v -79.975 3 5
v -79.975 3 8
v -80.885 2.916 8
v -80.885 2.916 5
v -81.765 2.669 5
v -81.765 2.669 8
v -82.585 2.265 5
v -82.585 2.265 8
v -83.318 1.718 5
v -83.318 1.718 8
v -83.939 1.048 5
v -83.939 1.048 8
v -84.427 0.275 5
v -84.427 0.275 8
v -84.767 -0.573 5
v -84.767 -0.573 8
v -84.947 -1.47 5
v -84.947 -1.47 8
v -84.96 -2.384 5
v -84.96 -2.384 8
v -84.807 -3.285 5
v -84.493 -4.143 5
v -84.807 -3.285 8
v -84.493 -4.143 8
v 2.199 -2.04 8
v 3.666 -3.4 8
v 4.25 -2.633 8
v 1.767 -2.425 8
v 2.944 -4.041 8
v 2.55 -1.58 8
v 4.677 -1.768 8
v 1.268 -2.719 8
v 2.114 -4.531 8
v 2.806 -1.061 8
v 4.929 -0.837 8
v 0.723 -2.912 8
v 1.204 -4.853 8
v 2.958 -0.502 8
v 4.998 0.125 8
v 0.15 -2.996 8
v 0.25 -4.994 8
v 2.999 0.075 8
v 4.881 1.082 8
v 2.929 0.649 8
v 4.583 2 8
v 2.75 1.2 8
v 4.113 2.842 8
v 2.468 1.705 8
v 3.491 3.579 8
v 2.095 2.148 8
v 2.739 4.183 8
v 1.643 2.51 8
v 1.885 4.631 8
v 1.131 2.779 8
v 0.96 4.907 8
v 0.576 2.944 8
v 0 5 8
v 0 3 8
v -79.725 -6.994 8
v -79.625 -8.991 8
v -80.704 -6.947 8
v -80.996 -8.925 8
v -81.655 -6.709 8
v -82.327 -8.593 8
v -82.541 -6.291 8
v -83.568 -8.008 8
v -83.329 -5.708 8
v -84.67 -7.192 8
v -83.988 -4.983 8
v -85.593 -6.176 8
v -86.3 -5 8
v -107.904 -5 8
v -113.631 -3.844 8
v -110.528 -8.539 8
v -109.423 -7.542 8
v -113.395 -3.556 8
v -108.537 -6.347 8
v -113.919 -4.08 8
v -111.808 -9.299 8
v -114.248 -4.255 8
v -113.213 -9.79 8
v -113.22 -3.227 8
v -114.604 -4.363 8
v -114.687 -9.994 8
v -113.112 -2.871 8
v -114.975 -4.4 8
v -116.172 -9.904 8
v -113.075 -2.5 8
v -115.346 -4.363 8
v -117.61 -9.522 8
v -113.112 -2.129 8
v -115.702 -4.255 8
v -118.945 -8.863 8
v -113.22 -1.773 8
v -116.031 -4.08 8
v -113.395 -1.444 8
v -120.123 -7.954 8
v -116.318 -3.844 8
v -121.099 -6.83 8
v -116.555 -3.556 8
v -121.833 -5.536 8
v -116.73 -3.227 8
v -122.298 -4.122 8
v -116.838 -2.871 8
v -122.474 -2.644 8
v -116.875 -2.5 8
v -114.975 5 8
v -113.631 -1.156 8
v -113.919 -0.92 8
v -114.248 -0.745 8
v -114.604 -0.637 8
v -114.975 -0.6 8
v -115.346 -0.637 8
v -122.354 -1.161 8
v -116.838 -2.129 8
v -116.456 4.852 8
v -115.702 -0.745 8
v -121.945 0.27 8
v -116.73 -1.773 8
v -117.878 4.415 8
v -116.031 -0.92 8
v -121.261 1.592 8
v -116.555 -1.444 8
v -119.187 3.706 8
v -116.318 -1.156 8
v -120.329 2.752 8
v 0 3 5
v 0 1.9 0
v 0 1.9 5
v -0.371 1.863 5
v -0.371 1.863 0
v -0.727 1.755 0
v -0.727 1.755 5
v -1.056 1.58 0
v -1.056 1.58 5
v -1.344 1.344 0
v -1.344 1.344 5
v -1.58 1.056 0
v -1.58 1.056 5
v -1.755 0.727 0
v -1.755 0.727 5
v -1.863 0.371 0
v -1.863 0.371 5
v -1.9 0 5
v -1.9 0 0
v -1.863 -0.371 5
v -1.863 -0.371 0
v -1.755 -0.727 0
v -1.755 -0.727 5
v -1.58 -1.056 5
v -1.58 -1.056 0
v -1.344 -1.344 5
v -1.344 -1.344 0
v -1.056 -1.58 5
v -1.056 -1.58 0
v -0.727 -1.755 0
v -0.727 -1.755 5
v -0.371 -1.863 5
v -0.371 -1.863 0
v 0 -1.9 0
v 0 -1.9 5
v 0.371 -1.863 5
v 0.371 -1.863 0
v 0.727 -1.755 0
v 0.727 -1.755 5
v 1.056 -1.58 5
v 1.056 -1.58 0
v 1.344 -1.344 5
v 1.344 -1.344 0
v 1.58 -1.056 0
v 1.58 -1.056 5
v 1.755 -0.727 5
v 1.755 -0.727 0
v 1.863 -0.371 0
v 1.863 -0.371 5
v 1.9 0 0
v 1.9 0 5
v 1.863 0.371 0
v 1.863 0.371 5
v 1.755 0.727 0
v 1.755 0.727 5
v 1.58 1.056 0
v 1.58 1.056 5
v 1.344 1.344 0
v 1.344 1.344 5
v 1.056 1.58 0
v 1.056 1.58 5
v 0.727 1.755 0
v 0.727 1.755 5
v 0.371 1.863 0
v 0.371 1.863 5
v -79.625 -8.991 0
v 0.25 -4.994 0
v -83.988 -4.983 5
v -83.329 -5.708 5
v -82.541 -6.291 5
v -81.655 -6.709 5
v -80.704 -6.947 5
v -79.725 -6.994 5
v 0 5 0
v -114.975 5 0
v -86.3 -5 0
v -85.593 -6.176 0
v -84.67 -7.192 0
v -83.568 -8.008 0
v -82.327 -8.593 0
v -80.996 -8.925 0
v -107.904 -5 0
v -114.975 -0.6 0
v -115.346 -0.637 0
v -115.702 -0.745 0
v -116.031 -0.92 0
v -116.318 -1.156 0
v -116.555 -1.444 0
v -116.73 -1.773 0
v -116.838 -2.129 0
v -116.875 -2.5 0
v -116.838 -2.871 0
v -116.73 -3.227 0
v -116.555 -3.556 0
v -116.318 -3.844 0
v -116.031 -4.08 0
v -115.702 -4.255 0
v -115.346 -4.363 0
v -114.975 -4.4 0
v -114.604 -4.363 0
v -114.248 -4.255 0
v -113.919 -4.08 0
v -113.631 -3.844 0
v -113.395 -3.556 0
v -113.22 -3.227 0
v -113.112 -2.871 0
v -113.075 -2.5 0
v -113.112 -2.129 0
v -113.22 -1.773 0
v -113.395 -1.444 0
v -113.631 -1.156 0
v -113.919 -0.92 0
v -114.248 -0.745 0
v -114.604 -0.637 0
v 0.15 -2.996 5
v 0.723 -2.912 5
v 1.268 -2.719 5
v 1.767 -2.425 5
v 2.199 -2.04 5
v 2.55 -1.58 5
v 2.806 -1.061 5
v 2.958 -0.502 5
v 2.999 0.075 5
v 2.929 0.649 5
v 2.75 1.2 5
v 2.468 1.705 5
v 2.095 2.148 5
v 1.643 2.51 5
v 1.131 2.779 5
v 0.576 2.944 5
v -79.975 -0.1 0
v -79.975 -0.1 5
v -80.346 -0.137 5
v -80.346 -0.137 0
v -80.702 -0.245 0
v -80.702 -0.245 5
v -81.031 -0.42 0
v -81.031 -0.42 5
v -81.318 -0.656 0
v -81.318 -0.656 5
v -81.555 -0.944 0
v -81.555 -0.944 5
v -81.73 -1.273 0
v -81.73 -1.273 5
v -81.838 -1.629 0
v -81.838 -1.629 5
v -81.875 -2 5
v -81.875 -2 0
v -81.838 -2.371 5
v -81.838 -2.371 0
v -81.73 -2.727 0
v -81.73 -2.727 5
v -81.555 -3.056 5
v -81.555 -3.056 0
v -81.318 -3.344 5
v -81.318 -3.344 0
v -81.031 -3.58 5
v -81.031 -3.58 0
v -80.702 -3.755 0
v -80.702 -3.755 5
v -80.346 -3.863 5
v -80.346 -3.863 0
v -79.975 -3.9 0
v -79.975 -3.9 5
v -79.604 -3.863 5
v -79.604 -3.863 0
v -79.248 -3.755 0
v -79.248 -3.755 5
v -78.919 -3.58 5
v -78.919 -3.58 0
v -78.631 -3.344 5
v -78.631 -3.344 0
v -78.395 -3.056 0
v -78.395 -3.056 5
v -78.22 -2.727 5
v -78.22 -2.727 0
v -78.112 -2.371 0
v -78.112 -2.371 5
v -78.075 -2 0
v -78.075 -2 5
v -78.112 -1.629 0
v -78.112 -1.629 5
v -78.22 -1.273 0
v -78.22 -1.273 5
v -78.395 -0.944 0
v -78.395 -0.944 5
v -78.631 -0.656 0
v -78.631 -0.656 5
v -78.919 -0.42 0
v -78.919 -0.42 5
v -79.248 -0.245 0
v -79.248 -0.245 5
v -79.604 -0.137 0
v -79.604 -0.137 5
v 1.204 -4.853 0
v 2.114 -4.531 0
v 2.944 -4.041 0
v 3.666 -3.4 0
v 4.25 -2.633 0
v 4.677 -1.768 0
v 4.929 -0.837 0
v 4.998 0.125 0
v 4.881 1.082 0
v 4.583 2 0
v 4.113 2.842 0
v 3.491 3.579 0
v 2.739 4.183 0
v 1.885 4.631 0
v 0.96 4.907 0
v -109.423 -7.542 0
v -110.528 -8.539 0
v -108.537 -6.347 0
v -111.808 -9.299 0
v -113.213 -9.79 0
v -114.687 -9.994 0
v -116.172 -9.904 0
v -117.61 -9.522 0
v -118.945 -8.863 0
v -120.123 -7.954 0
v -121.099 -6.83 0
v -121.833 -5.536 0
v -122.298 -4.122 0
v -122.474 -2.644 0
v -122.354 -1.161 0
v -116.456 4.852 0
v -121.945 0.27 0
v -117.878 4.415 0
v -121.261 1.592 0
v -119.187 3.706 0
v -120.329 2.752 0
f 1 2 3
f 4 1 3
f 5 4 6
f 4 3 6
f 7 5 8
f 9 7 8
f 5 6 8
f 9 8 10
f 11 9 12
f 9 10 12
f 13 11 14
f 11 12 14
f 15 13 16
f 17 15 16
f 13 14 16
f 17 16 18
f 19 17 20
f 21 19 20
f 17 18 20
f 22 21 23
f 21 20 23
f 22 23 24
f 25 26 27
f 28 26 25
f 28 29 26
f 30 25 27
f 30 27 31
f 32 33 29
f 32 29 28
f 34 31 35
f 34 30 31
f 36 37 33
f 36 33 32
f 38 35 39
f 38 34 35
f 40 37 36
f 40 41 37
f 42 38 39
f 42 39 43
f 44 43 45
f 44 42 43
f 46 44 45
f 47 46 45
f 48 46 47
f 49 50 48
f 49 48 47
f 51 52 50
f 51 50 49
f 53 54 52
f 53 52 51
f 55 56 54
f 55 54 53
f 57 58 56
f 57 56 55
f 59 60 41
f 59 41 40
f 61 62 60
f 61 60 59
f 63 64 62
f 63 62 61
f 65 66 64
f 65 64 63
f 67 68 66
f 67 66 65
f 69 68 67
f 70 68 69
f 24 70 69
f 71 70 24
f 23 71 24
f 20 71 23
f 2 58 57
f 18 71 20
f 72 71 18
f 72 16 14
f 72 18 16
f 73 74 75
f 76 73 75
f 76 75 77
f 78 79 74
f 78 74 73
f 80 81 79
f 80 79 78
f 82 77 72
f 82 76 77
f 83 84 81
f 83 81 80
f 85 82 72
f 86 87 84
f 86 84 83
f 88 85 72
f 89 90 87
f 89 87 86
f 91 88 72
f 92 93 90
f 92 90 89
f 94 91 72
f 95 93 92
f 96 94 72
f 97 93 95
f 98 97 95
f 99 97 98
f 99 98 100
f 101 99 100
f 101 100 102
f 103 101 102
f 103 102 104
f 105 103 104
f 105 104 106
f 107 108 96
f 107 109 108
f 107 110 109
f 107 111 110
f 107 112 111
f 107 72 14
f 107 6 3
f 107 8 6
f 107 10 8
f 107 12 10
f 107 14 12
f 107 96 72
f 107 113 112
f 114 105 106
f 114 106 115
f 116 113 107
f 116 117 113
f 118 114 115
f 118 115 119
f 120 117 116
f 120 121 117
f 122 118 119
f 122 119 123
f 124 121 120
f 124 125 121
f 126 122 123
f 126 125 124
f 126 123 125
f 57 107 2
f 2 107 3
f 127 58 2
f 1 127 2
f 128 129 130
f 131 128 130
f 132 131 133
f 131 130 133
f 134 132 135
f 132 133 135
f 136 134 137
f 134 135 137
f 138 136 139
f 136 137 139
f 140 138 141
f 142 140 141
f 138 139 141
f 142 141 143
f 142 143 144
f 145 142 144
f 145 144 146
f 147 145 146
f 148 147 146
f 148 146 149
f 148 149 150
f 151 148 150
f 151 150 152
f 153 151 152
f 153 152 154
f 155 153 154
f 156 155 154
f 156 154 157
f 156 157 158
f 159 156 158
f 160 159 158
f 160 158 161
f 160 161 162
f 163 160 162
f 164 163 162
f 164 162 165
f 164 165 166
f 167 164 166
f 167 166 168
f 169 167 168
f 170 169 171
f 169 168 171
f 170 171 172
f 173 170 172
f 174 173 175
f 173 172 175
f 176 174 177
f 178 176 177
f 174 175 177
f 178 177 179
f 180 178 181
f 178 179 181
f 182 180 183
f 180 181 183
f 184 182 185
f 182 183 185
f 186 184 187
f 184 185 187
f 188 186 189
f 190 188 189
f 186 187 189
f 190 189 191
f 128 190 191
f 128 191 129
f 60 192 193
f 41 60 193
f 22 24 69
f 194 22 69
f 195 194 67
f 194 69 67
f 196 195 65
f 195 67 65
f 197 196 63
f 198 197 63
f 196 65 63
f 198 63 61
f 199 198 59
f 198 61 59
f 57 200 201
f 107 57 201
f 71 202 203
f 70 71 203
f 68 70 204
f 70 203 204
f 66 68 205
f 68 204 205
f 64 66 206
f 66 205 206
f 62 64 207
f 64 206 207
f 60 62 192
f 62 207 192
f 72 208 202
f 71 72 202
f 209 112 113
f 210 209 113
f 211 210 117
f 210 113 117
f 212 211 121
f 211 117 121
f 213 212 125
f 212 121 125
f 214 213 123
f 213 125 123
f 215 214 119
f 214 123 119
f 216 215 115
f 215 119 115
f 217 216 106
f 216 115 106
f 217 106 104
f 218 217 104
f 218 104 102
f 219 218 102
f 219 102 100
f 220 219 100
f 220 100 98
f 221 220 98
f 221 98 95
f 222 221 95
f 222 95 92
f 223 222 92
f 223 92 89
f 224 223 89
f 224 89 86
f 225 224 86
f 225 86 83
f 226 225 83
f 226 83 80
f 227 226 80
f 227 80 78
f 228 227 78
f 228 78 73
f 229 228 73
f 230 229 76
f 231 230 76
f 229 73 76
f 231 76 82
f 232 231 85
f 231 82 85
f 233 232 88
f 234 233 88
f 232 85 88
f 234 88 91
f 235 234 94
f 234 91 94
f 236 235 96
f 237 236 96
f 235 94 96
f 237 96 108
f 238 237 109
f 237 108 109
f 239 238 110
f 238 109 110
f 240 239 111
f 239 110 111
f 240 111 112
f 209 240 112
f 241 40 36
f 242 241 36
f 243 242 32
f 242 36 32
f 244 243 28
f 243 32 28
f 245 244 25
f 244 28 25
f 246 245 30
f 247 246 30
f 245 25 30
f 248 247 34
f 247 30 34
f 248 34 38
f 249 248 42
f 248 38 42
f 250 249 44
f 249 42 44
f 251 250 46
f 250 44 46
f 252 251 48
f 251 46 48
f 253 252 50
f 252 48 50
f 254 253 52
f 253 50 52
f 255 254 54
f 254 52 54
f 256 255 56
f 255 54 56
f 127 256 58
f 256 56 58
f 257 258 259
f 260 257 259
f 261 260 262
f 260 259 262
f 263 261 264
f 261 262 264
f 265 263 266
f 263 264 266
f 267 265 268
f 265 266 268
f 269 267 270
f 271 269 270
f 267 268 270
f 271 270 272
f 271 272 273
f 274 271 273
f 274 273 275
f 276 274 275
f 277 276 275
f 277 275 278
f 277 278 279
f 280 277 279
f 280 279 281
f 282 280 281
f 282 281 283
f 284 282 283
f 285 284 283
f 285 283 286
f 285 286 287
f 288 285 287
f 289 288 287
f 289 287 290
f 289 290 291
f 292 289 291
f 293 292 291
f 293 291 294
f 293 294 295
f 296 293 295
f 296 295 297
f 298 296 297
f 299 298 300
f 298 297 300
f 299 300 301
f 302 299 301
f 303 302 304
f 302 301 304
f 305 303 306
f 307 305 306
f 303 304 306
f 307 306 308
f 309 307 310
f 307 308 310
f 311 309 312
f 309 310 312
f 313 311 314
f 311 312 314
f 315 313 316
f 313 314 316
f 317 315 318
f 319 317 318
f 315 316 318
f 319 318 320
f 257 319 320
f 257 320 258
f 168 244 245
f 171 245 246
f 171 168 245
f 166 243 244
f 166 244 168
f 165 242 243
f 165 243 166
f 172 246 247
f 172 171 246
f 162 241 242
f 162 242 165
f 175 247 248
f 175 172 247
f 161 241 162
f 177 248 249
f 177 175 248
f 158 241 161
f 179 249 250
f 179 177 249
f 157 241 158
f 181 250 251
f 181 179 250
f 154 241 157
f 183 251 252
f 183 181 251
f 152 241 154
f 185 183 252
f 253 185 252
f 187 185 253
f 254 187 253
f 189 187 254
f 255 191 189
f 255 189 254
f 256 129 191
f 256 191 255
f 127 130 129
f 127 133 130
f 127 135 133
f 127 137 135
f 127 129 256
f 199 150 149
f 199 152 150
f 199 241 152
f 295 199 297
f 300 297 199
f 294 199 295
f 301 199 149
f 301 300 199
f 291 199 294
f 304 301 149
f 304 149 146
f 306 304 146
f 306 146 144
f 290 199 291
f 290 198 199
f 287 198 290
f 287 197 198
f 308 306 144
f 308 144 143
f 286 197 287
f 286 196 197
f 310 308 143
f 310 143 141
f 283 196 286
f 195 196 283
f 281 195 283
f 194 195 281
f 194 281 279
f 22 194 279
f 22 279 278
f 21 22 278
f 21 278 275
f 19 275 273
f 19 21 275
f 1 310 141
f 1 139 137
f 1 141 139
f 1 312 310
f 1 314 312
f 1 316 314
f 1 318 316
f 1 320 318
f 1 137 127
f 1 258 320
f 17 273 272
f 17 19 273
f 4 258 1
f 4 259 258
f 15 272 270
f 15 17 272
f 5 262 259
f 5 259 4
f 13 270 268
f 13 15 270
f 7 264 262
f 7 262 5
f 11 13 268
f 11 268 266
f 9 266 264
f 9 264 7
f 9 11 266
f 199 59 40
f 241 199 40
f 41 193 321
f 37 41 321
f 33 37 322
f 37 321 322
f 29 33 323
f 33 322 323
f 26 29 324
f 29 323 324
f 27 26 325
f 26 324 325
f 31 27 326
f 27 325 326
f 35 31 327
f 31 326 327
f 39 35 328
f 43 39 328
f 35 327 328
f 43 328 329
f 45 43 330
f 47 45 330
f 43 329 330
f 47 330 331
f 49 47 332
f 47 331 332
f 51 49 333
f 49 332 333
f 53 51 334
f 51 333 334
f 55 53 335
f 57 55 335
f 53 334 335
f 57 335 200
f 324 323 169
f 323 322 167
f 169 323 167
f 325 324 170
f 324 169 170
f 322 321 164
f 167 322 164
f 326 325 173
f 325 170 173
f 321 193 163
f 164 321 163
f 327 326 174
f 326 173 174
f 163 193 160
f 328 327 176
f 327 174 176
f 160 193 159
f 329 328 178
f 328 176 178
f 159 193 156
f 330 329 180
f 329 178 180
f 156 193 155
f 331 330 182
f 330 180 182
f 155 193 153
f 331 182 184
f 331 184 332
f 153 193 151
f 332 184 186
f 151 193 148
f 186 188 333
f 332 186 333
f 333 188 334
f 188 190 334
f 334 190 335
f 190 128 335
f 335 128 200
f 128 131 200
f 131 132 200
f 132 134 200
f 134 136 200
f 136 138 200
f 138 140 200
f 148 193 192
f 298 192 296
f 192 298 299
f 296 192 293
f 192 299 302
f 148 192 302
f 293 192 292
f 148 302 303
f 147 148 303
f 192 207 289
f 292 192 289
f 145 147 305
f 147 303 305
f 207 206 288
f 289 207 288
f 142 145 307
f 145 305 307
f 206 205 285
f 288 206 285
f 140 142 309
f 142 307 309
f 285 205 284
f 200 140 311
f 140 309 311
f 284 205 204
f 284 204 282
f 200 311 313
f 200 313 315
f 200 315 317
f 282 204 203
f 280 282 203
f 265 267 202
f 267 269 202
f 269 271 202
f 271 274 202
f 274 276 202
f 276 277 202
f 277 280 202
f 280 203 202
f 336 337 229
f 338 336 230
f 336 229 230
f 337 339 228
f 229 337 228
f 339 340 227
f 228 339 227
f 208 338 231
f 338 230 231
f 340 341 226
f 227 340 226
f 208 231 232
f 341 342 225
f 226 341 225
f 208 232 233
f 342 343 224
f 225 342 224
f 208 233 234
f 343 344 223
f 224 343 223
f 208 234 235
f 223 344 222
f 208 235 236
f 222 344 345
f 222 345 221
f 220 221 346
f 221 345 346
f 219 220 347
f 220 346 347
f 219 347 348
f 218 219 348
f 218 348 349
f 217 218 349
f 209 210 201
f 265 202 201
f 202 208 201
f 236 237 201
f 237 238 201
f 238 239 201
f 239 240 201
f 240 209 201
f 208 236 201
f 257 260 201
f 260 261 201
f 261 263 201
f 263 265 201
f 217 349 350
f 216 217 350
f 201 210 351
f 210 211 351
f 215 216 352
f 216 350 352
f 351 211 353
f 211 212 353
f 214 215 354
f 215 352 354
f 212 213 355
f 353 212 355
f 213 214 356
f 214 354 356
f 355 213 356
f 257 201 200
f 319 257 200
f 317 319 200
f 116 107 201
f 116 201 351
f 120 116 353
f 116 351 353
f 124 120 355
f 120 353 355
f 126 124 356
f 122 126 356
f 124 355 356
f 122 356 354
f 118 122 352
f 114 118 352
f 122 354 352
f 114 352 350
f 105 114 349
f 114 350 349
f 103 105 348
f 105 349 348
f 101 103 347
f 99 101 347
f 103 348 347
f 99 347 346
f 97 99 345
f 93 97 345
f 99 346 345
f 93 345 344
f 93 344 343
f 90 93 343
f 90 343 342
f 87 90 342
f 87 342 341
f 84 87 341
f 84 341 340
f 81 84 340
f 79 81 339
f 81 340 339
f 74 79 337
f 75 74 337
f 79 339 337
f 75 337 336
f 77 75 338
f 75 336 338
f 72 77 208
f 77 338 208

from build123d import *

# Parameters (mm, degrees)
F1_DEPTH = 8
F2_R     = 1.9
F3_DEPTH = 8.001
F5_DEPTH = 3
F6_ANGLE = 90


with BuildPart() as f1:
    # F0 (on Top) → F1 (new body)
    with BuildSketch(Plane.XY):
        with BuildLine():
            ThreePointArc((-0.125, 4.9984372558), (-3.6656130115, 3.4004825025), (-4.99375, -0.2499218628))
            ThreePointArc((-4.99375, -0.2499218628), (0.125, -4.9984372558), (5, 0))
            ThreePointArc((5, 0), (3.4910600109, 3.5794552658), (-0.125, 4.9984372558))
        make_face()
        with BuildLine():
            Line((-8.99125, 79.6251054846), (-4.99375, -0.2499218628))
            ThreePointArc((-4.99375, -0.2499218628), (-3.6656130115, 3.4004825025), (-0.125, 4.9984372558))
            Line((-0.125, 4.9984372558), (-1.825, 72.9771839344))
            ThreePointArc((-1.825, 72.9771839344), (-6.7606755035, 74.8431378764), (-8.99125, 79.6251054846))
        make_face()
        with BuildLine():
            ThreePointArc((-0.125, 4.9984372558), (3.4910600109, 3.5794552658), (5, 0))
            Line((5, 0), (5, 79.9749960925))
            ThreePointArc((5, 79.9749960925), (3.0112373721, 75.0875120772), (-1.825, 72.9771839344))
            Line((-1.825, 72.9771839344), (-0.125, 4.9984372558))
        make_face()
        with BuildLine():
            ThreePointArc((-5, 86.2995514129), (-8.0077721539, 83.567582034), (-8.99125, 79.6251054846))
            ThreePointArc((-8.99125, 79.6251054846), (-6.7606755035, 74.8431378764), (-1.825, 72.9771839344))
            Line((-1.825, 72.9771839344), (-2, 79.9749960925))
            Line((-2, 79.9749960925), (-5, 79.9749960925))
            Line((-5, 79.9749960925), (-5, 86.2995514129))
        make_face()
        with BuildLine():
            Line((-2, 79.9749960925), (5, 79.9749960925))
            ThreePointArc((5, 79.9749960925), (1.7416573868, 85.8910758756), (-5, 86.2995514129))
            Line((-5, 86.2995514129), (-5, 79.9749960925))
            Line((-5, 79.9749960925), (-2, 79.9749960925))
        make_face()
        with BuildLine():
            ThreePointArc((-1.825, 72.9771839344), (3.0112373721, 75.0875120772), (5, 79.9749960925))
            Line((5, 79.9749960925), (-2, 79.9749960925))
            Line((-2, 79.9749960925), (-1.825, 72.9771839344))
        make_face()
        with BuildLine():
            ThreePointArc((-5, 86.2995514129), (1.7416573868, 85.8910758756), (5, 79.9749960925))
            Line((5, 79.9749960925), (5, 114.9749960925))
            ThreePointArc((5, 114.9749960925), (1.8301270189, 108.8512717356), (-5, 107.9039282807))
            Line((-5, 107.9039282807), (-5, 86.2995514129))
        make_face()
        with BuildLine():
            ThreePointArc((-5, 107.9039282807), (1.8301270189, 108.8512717356), (5, 114.9749960925))
            Line((5, 114.9749960925), (-5, 114.9749960925))
            Line((-5, 114.9749960925), (-5, 107.9039282807))
        make_face()
        with BuildLine():
            Line((-5, 114.9749960925), (5, 114.9749960925))
            ThreePointArc((5, 114.9749960925), (-6.8301270189, 121.0987204495), (-5, 107.9039282807))
            Line((-5, 107.9039282807), (-5, 114.9749960925))
        make_face()
    extrude(amount=F1_DEPTH)

    # F2 (on face) → F3 (cut, through all)
    with BuildSketch(Plane.XY.offset(8)):
        with Locations((-2, 79.9749960925)):
            Circle(F2_R)
        with Locations((-2.5, 114.9749960925)):
            Circle(F2_R)
        Circle(F2_R)
    extrude(amount=-F3_DEPTH, mode=Mode.SUBTRACT)

    # F4 (on face) → F5 (cut)
    with BuildSketch(Plane.XY.offset(8)):
        with BuildLine():
            ThreePointArc((-2.99625, -0.1499531177), (0.075, -2.9990623535), (3, 0))
            Line((3, 0), (3, 79.9749960925))
            ThreePointArc((3, 79.9749960925), (0.6726124191, 84.2007673662), (-4.1428571429, 84.4925356071))
            ThreePointArc((-4.1428571429, 84.4925356071), (-6.2912658242, 82.5411289079), (-6.99375, 79.7250742297))
            Line((-6.99375, 79.7250742297), (-2.99625, -0.1499531177))
        make_face()
    extrude(amount=-F5_DEPTH, mode=Mode.SUBTRACT)


with BuildPart() as f1_1:
    # F6: moved
    add(f1.part.rotate(Axis((0, 0, 5), (0, 0, 1)), F6_ANGLE))


solid = f1_1.part
